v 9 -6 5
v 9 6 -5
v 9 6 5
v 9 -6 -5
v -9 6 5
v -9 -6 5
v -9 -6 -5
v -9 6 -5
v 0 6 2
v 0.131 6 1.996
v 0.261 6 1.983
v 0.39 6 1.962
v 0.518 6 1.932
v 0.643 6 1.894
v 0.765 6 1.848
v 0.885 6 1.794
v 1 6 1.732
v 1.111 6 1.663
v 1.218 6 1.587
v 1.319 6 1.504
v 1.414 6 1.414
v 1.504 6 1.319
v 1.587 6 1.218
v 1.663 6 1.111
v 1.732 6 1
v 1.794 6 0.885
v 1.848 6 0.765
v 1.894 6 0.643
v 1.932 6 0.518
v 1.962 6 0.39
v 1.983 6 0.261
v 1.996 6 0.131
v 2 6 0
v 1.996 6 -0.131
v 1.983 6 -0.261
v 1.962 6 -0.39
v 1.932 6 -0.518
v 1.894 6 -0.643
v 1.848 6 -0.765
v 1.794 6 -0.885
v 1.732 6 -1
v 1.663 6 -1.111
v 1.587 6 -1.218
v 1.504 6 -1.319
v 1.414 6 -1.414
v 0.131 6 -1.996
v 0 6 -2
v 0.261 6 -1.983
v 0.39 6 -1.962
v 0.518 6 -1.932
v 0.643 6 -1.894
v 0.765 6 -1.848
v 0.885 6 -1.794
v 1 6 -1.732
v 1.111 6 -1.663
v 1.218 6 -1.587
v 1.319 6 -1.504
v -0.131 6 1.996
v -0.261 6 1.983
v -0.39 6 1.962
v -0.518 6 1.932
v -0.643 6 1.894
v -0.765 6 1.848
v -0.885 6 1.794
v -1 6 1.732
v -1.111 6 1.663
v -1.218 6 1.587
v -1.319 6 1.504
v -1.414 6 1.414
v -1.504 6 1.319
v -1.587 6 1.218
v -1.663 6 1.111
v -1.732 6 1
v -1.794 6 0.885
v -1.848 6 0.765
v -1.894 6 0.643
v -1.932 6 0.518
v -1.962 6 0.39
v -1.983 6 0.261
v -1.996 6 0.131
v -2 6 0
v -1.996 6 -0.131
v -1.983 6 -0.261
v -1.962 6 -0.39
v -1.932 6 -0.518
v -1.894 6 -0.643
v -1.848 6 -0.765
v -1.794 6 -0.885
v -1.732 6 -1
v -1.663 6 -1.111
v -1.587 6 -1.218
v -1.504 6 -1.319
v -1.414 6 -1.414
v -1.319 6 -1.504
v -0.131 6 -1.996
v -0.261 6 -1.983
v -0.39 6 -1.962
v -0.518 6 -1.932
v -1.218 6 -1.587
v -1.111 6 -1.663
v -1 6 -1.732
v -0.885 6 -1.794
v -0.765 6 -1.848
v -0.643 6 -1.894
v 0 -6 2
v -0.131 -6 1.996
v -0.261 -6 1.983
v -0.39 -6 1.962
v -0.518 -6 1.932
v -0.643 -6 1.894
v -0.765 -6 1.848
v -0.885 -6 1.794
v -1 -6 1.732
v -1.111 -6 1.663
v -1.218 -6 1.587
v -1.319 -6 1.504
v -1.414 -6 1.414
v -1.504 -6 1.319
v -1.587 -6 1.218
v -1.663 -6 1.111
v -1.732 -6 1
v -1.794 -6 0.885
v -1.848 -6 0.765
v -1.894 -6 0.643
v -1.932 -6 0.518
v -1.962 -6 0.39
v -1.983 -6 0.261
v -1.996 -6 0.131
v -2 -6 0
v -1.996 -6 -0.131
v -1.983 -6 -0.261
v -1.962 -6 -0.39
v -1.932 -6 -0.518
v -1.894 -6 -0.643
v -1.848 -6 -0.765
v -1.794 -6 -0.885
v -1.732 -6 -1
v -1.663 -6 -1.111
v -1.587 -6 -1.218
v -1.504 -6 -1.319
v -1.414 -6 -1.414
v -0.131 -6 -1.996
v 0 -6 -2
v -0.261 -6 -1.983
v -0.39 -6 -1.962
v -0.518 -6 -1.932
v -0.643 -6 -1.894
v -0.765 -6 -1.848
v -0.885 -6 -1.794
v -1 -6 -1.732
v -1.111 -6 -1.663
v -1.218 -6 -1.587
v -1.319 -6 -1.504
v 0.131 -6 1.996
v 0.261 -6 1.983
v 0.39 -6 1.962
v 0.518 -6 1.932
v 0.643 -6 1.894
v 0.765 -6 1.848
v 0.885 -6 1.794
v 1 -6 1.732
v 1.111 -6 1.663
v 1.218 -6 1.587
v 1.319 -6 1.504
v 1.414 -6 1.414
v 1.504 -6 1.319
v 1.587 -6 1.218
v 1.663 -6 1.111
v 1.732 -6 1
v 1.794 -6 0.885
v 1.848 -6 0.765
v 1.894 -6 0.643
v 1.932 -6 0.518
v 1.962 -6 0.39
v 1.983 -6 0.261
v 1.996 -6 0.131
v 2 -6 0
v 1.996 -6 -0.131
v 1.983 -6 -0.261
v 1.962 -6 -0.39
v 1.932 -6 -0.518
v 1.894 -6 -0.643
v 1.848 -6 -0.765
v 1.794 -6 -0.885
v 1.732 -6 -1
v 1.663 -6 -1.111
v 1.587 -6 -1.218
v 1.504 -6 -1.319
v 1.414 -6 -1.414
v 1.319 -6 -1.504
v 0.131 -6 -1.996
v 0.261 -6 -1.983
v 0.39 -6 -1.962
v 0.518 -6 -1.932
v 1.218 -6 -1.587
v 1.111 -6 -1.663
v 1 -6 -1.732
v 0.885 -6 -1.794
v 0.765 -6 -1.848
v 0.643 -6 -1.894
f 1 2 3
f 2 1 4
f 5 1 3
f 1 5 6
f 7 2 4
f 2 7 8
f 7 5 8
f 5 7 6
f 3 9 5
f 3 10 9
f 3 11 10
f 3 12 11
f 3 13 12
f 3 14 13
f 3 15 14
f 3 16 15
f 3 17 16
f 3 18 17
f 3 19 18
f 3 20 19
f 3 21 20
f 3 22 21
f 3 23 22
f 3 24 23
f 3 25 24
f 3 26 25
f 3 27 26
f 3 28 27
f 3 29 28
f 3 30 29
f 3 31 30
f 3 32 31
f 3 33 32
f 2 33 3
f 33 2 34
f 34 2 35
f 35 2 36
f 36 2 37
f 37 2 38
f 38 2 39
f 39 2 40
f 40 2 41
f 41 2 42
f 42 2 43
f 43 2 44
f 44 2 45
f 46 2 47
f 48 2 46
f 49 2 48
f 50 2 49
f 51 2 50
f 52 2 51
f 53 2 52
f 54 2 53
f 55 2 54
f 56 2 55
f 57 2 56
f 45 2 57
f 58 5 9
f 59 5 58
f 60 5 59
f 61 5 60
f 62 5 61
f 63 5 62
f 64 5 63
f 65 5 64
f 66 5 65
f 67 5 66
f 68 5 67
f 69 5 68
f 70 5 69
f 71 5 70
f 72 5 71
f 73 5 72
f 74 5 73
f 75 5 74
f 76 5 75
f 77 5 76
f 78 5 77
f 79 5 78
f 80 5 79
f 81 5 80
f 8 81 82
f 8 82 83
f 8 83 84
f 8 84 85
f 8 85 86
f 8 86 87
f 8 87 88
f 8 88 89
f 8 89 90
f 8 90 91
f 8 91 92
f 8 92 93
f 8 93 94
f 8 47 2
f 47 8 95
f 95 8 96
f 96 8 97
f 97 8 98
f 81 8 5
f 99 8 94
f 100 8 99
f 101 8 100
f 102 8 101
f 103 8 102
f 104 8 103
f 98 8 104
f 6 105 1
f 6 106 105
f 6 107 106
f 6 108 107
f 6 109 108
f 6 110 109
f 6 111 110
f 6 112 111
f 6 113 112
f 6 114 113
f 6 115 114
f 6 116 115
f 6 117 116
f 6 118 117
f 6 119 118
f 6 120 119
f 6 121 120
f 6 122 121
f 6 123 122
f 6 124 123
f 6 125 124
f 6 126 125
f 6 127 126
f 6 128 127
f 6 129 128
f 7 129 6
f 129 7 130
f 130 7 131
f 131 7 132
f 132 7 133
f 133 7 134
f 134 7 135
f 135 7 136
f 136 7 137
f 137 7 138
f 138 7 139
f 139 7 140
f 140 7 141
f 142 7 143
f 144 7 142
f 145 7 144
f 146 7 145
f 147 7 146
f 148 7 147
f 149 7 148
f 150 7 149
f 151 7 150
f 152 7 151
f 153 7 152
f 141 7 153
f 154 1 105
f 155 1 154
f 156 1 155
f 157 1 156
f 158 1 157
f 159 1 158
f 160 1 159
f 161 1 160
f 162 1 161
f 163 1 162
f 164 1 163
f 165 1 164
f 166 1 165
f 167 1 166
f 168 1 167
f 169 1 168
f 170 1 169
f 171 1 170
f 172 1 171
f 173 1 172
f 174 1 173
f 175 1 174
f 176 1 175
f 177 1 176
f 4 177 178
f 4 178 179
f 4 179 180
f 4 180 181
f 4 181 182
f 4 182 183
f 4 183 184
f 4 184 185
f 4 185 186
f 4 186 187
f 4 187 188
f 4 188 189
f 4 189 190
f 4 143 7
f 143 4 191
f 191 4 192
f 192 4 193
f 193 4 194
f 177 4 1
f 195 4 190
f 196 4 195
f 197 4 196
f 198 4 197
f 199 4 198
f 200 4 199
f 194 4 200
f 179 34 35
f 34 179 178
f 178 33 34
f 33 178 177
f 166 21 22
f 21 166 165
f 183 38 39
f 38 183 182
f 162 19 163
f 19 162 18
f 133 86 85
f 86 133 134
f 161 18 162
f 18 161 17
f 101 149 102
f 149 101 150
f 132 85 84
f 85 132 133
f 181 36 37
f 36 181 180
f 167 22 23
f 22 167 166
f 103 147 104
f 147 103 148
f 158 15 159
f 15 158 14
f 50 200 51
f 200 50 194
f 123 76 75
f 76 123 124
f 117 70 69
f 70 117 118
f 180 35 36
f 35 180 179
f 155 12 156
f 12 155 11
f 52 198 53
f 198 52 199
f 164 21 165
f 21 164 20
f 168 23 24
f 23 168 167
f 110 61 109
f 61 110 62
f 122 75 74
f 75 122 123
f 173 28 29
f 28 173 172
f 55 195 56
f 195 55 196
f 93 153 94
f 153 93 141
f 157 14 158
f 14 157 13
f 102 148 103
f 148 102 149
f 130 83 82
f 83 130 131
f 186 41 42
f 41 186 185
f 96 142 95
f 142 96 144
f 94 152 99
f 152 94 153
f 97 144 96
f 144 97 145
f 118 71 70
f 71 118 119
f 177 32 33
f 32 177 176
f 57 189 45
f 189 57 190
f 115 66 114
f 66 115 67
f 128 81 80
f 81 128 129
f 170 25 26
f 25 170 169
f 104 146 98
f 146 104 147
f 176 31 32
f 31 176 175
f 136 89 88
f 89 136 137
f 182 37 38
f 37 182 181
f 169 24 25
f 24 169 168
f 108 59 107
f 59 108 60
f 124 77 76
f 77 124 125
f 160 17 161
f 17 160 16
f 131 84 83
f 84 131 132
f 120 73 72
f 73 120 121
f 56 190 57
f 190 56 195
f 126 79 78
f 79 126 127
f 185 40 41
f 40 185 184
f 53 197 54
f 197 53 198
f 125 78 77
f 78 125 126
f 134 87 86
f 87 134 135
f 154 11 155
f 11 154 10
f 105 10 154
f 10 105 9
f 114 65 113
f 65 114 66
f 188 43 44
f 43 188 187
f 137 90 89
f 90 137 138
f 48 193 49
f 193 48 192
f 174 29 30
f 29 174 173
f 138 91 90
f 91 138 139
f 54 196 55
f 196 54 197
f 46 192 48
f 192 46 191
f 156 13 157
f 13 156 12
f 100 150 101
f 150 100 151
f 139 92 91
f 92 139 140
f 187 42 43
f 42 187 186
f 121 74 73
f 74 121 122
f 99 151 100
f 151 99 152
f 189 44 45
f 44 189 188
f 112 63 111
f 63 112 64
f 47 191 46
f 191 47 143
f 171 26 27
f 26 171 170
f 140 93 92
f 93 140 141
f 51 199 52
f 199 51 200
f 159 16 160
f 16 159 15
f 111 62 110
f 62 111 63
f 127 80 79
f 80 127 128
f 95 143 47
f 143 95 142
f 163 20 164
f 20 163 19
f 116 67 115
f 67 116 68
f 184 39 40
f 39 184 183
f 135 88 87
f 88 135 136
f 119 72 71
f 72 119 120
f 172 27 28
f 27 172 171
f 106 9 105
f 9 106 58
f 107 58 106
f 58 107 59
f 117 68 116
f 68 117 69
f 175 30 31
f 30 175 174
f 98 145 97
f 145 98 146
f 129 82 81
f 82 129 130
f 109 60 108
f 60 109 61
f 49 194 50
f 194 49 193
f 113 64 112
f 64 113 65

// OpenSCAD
// Auto-generated from tests/data/feature_fixtures_manifest.json
// fixture: box_y_through_hole
// fixture_type: box
// description: Box with one through-hole along the y axis. Covers y-axis hole case missing from existing suite.
$fn = 96;

box_size = [18.000000, 12.000000, 10.000000];
box_origin = [-9.000000, -6.000000, -5.000000];

module through_hole_x(center, diameter, length) {
  translate([box_origin[0] - 0.1, center[1], center[2]])
    rotate(a=90, v=[0, 1, 0]) cylinder(d=diameter, h=length, center=false);
}

module through_hole_y(center, diameter, length) {
  translate([center[0], box_origin[1] - 0.1, center[2]])
    rotate(a=90, v=[-1, 0, 0]) cylinder(d=diameter, h=length, center=false);
}

module through_hole_z(center, diameter, length) {
  translate([center[0], center[1], box_origin[2] - 0.1])
    cylinder(d=diameter, h=length, center=false);
}

difference() {
  translate(box_origin) cube(box_size);
  through_hole_y([0.000000, 0.000000, 0.000000], 4.000000, 12.200000);  // hole_0
}
